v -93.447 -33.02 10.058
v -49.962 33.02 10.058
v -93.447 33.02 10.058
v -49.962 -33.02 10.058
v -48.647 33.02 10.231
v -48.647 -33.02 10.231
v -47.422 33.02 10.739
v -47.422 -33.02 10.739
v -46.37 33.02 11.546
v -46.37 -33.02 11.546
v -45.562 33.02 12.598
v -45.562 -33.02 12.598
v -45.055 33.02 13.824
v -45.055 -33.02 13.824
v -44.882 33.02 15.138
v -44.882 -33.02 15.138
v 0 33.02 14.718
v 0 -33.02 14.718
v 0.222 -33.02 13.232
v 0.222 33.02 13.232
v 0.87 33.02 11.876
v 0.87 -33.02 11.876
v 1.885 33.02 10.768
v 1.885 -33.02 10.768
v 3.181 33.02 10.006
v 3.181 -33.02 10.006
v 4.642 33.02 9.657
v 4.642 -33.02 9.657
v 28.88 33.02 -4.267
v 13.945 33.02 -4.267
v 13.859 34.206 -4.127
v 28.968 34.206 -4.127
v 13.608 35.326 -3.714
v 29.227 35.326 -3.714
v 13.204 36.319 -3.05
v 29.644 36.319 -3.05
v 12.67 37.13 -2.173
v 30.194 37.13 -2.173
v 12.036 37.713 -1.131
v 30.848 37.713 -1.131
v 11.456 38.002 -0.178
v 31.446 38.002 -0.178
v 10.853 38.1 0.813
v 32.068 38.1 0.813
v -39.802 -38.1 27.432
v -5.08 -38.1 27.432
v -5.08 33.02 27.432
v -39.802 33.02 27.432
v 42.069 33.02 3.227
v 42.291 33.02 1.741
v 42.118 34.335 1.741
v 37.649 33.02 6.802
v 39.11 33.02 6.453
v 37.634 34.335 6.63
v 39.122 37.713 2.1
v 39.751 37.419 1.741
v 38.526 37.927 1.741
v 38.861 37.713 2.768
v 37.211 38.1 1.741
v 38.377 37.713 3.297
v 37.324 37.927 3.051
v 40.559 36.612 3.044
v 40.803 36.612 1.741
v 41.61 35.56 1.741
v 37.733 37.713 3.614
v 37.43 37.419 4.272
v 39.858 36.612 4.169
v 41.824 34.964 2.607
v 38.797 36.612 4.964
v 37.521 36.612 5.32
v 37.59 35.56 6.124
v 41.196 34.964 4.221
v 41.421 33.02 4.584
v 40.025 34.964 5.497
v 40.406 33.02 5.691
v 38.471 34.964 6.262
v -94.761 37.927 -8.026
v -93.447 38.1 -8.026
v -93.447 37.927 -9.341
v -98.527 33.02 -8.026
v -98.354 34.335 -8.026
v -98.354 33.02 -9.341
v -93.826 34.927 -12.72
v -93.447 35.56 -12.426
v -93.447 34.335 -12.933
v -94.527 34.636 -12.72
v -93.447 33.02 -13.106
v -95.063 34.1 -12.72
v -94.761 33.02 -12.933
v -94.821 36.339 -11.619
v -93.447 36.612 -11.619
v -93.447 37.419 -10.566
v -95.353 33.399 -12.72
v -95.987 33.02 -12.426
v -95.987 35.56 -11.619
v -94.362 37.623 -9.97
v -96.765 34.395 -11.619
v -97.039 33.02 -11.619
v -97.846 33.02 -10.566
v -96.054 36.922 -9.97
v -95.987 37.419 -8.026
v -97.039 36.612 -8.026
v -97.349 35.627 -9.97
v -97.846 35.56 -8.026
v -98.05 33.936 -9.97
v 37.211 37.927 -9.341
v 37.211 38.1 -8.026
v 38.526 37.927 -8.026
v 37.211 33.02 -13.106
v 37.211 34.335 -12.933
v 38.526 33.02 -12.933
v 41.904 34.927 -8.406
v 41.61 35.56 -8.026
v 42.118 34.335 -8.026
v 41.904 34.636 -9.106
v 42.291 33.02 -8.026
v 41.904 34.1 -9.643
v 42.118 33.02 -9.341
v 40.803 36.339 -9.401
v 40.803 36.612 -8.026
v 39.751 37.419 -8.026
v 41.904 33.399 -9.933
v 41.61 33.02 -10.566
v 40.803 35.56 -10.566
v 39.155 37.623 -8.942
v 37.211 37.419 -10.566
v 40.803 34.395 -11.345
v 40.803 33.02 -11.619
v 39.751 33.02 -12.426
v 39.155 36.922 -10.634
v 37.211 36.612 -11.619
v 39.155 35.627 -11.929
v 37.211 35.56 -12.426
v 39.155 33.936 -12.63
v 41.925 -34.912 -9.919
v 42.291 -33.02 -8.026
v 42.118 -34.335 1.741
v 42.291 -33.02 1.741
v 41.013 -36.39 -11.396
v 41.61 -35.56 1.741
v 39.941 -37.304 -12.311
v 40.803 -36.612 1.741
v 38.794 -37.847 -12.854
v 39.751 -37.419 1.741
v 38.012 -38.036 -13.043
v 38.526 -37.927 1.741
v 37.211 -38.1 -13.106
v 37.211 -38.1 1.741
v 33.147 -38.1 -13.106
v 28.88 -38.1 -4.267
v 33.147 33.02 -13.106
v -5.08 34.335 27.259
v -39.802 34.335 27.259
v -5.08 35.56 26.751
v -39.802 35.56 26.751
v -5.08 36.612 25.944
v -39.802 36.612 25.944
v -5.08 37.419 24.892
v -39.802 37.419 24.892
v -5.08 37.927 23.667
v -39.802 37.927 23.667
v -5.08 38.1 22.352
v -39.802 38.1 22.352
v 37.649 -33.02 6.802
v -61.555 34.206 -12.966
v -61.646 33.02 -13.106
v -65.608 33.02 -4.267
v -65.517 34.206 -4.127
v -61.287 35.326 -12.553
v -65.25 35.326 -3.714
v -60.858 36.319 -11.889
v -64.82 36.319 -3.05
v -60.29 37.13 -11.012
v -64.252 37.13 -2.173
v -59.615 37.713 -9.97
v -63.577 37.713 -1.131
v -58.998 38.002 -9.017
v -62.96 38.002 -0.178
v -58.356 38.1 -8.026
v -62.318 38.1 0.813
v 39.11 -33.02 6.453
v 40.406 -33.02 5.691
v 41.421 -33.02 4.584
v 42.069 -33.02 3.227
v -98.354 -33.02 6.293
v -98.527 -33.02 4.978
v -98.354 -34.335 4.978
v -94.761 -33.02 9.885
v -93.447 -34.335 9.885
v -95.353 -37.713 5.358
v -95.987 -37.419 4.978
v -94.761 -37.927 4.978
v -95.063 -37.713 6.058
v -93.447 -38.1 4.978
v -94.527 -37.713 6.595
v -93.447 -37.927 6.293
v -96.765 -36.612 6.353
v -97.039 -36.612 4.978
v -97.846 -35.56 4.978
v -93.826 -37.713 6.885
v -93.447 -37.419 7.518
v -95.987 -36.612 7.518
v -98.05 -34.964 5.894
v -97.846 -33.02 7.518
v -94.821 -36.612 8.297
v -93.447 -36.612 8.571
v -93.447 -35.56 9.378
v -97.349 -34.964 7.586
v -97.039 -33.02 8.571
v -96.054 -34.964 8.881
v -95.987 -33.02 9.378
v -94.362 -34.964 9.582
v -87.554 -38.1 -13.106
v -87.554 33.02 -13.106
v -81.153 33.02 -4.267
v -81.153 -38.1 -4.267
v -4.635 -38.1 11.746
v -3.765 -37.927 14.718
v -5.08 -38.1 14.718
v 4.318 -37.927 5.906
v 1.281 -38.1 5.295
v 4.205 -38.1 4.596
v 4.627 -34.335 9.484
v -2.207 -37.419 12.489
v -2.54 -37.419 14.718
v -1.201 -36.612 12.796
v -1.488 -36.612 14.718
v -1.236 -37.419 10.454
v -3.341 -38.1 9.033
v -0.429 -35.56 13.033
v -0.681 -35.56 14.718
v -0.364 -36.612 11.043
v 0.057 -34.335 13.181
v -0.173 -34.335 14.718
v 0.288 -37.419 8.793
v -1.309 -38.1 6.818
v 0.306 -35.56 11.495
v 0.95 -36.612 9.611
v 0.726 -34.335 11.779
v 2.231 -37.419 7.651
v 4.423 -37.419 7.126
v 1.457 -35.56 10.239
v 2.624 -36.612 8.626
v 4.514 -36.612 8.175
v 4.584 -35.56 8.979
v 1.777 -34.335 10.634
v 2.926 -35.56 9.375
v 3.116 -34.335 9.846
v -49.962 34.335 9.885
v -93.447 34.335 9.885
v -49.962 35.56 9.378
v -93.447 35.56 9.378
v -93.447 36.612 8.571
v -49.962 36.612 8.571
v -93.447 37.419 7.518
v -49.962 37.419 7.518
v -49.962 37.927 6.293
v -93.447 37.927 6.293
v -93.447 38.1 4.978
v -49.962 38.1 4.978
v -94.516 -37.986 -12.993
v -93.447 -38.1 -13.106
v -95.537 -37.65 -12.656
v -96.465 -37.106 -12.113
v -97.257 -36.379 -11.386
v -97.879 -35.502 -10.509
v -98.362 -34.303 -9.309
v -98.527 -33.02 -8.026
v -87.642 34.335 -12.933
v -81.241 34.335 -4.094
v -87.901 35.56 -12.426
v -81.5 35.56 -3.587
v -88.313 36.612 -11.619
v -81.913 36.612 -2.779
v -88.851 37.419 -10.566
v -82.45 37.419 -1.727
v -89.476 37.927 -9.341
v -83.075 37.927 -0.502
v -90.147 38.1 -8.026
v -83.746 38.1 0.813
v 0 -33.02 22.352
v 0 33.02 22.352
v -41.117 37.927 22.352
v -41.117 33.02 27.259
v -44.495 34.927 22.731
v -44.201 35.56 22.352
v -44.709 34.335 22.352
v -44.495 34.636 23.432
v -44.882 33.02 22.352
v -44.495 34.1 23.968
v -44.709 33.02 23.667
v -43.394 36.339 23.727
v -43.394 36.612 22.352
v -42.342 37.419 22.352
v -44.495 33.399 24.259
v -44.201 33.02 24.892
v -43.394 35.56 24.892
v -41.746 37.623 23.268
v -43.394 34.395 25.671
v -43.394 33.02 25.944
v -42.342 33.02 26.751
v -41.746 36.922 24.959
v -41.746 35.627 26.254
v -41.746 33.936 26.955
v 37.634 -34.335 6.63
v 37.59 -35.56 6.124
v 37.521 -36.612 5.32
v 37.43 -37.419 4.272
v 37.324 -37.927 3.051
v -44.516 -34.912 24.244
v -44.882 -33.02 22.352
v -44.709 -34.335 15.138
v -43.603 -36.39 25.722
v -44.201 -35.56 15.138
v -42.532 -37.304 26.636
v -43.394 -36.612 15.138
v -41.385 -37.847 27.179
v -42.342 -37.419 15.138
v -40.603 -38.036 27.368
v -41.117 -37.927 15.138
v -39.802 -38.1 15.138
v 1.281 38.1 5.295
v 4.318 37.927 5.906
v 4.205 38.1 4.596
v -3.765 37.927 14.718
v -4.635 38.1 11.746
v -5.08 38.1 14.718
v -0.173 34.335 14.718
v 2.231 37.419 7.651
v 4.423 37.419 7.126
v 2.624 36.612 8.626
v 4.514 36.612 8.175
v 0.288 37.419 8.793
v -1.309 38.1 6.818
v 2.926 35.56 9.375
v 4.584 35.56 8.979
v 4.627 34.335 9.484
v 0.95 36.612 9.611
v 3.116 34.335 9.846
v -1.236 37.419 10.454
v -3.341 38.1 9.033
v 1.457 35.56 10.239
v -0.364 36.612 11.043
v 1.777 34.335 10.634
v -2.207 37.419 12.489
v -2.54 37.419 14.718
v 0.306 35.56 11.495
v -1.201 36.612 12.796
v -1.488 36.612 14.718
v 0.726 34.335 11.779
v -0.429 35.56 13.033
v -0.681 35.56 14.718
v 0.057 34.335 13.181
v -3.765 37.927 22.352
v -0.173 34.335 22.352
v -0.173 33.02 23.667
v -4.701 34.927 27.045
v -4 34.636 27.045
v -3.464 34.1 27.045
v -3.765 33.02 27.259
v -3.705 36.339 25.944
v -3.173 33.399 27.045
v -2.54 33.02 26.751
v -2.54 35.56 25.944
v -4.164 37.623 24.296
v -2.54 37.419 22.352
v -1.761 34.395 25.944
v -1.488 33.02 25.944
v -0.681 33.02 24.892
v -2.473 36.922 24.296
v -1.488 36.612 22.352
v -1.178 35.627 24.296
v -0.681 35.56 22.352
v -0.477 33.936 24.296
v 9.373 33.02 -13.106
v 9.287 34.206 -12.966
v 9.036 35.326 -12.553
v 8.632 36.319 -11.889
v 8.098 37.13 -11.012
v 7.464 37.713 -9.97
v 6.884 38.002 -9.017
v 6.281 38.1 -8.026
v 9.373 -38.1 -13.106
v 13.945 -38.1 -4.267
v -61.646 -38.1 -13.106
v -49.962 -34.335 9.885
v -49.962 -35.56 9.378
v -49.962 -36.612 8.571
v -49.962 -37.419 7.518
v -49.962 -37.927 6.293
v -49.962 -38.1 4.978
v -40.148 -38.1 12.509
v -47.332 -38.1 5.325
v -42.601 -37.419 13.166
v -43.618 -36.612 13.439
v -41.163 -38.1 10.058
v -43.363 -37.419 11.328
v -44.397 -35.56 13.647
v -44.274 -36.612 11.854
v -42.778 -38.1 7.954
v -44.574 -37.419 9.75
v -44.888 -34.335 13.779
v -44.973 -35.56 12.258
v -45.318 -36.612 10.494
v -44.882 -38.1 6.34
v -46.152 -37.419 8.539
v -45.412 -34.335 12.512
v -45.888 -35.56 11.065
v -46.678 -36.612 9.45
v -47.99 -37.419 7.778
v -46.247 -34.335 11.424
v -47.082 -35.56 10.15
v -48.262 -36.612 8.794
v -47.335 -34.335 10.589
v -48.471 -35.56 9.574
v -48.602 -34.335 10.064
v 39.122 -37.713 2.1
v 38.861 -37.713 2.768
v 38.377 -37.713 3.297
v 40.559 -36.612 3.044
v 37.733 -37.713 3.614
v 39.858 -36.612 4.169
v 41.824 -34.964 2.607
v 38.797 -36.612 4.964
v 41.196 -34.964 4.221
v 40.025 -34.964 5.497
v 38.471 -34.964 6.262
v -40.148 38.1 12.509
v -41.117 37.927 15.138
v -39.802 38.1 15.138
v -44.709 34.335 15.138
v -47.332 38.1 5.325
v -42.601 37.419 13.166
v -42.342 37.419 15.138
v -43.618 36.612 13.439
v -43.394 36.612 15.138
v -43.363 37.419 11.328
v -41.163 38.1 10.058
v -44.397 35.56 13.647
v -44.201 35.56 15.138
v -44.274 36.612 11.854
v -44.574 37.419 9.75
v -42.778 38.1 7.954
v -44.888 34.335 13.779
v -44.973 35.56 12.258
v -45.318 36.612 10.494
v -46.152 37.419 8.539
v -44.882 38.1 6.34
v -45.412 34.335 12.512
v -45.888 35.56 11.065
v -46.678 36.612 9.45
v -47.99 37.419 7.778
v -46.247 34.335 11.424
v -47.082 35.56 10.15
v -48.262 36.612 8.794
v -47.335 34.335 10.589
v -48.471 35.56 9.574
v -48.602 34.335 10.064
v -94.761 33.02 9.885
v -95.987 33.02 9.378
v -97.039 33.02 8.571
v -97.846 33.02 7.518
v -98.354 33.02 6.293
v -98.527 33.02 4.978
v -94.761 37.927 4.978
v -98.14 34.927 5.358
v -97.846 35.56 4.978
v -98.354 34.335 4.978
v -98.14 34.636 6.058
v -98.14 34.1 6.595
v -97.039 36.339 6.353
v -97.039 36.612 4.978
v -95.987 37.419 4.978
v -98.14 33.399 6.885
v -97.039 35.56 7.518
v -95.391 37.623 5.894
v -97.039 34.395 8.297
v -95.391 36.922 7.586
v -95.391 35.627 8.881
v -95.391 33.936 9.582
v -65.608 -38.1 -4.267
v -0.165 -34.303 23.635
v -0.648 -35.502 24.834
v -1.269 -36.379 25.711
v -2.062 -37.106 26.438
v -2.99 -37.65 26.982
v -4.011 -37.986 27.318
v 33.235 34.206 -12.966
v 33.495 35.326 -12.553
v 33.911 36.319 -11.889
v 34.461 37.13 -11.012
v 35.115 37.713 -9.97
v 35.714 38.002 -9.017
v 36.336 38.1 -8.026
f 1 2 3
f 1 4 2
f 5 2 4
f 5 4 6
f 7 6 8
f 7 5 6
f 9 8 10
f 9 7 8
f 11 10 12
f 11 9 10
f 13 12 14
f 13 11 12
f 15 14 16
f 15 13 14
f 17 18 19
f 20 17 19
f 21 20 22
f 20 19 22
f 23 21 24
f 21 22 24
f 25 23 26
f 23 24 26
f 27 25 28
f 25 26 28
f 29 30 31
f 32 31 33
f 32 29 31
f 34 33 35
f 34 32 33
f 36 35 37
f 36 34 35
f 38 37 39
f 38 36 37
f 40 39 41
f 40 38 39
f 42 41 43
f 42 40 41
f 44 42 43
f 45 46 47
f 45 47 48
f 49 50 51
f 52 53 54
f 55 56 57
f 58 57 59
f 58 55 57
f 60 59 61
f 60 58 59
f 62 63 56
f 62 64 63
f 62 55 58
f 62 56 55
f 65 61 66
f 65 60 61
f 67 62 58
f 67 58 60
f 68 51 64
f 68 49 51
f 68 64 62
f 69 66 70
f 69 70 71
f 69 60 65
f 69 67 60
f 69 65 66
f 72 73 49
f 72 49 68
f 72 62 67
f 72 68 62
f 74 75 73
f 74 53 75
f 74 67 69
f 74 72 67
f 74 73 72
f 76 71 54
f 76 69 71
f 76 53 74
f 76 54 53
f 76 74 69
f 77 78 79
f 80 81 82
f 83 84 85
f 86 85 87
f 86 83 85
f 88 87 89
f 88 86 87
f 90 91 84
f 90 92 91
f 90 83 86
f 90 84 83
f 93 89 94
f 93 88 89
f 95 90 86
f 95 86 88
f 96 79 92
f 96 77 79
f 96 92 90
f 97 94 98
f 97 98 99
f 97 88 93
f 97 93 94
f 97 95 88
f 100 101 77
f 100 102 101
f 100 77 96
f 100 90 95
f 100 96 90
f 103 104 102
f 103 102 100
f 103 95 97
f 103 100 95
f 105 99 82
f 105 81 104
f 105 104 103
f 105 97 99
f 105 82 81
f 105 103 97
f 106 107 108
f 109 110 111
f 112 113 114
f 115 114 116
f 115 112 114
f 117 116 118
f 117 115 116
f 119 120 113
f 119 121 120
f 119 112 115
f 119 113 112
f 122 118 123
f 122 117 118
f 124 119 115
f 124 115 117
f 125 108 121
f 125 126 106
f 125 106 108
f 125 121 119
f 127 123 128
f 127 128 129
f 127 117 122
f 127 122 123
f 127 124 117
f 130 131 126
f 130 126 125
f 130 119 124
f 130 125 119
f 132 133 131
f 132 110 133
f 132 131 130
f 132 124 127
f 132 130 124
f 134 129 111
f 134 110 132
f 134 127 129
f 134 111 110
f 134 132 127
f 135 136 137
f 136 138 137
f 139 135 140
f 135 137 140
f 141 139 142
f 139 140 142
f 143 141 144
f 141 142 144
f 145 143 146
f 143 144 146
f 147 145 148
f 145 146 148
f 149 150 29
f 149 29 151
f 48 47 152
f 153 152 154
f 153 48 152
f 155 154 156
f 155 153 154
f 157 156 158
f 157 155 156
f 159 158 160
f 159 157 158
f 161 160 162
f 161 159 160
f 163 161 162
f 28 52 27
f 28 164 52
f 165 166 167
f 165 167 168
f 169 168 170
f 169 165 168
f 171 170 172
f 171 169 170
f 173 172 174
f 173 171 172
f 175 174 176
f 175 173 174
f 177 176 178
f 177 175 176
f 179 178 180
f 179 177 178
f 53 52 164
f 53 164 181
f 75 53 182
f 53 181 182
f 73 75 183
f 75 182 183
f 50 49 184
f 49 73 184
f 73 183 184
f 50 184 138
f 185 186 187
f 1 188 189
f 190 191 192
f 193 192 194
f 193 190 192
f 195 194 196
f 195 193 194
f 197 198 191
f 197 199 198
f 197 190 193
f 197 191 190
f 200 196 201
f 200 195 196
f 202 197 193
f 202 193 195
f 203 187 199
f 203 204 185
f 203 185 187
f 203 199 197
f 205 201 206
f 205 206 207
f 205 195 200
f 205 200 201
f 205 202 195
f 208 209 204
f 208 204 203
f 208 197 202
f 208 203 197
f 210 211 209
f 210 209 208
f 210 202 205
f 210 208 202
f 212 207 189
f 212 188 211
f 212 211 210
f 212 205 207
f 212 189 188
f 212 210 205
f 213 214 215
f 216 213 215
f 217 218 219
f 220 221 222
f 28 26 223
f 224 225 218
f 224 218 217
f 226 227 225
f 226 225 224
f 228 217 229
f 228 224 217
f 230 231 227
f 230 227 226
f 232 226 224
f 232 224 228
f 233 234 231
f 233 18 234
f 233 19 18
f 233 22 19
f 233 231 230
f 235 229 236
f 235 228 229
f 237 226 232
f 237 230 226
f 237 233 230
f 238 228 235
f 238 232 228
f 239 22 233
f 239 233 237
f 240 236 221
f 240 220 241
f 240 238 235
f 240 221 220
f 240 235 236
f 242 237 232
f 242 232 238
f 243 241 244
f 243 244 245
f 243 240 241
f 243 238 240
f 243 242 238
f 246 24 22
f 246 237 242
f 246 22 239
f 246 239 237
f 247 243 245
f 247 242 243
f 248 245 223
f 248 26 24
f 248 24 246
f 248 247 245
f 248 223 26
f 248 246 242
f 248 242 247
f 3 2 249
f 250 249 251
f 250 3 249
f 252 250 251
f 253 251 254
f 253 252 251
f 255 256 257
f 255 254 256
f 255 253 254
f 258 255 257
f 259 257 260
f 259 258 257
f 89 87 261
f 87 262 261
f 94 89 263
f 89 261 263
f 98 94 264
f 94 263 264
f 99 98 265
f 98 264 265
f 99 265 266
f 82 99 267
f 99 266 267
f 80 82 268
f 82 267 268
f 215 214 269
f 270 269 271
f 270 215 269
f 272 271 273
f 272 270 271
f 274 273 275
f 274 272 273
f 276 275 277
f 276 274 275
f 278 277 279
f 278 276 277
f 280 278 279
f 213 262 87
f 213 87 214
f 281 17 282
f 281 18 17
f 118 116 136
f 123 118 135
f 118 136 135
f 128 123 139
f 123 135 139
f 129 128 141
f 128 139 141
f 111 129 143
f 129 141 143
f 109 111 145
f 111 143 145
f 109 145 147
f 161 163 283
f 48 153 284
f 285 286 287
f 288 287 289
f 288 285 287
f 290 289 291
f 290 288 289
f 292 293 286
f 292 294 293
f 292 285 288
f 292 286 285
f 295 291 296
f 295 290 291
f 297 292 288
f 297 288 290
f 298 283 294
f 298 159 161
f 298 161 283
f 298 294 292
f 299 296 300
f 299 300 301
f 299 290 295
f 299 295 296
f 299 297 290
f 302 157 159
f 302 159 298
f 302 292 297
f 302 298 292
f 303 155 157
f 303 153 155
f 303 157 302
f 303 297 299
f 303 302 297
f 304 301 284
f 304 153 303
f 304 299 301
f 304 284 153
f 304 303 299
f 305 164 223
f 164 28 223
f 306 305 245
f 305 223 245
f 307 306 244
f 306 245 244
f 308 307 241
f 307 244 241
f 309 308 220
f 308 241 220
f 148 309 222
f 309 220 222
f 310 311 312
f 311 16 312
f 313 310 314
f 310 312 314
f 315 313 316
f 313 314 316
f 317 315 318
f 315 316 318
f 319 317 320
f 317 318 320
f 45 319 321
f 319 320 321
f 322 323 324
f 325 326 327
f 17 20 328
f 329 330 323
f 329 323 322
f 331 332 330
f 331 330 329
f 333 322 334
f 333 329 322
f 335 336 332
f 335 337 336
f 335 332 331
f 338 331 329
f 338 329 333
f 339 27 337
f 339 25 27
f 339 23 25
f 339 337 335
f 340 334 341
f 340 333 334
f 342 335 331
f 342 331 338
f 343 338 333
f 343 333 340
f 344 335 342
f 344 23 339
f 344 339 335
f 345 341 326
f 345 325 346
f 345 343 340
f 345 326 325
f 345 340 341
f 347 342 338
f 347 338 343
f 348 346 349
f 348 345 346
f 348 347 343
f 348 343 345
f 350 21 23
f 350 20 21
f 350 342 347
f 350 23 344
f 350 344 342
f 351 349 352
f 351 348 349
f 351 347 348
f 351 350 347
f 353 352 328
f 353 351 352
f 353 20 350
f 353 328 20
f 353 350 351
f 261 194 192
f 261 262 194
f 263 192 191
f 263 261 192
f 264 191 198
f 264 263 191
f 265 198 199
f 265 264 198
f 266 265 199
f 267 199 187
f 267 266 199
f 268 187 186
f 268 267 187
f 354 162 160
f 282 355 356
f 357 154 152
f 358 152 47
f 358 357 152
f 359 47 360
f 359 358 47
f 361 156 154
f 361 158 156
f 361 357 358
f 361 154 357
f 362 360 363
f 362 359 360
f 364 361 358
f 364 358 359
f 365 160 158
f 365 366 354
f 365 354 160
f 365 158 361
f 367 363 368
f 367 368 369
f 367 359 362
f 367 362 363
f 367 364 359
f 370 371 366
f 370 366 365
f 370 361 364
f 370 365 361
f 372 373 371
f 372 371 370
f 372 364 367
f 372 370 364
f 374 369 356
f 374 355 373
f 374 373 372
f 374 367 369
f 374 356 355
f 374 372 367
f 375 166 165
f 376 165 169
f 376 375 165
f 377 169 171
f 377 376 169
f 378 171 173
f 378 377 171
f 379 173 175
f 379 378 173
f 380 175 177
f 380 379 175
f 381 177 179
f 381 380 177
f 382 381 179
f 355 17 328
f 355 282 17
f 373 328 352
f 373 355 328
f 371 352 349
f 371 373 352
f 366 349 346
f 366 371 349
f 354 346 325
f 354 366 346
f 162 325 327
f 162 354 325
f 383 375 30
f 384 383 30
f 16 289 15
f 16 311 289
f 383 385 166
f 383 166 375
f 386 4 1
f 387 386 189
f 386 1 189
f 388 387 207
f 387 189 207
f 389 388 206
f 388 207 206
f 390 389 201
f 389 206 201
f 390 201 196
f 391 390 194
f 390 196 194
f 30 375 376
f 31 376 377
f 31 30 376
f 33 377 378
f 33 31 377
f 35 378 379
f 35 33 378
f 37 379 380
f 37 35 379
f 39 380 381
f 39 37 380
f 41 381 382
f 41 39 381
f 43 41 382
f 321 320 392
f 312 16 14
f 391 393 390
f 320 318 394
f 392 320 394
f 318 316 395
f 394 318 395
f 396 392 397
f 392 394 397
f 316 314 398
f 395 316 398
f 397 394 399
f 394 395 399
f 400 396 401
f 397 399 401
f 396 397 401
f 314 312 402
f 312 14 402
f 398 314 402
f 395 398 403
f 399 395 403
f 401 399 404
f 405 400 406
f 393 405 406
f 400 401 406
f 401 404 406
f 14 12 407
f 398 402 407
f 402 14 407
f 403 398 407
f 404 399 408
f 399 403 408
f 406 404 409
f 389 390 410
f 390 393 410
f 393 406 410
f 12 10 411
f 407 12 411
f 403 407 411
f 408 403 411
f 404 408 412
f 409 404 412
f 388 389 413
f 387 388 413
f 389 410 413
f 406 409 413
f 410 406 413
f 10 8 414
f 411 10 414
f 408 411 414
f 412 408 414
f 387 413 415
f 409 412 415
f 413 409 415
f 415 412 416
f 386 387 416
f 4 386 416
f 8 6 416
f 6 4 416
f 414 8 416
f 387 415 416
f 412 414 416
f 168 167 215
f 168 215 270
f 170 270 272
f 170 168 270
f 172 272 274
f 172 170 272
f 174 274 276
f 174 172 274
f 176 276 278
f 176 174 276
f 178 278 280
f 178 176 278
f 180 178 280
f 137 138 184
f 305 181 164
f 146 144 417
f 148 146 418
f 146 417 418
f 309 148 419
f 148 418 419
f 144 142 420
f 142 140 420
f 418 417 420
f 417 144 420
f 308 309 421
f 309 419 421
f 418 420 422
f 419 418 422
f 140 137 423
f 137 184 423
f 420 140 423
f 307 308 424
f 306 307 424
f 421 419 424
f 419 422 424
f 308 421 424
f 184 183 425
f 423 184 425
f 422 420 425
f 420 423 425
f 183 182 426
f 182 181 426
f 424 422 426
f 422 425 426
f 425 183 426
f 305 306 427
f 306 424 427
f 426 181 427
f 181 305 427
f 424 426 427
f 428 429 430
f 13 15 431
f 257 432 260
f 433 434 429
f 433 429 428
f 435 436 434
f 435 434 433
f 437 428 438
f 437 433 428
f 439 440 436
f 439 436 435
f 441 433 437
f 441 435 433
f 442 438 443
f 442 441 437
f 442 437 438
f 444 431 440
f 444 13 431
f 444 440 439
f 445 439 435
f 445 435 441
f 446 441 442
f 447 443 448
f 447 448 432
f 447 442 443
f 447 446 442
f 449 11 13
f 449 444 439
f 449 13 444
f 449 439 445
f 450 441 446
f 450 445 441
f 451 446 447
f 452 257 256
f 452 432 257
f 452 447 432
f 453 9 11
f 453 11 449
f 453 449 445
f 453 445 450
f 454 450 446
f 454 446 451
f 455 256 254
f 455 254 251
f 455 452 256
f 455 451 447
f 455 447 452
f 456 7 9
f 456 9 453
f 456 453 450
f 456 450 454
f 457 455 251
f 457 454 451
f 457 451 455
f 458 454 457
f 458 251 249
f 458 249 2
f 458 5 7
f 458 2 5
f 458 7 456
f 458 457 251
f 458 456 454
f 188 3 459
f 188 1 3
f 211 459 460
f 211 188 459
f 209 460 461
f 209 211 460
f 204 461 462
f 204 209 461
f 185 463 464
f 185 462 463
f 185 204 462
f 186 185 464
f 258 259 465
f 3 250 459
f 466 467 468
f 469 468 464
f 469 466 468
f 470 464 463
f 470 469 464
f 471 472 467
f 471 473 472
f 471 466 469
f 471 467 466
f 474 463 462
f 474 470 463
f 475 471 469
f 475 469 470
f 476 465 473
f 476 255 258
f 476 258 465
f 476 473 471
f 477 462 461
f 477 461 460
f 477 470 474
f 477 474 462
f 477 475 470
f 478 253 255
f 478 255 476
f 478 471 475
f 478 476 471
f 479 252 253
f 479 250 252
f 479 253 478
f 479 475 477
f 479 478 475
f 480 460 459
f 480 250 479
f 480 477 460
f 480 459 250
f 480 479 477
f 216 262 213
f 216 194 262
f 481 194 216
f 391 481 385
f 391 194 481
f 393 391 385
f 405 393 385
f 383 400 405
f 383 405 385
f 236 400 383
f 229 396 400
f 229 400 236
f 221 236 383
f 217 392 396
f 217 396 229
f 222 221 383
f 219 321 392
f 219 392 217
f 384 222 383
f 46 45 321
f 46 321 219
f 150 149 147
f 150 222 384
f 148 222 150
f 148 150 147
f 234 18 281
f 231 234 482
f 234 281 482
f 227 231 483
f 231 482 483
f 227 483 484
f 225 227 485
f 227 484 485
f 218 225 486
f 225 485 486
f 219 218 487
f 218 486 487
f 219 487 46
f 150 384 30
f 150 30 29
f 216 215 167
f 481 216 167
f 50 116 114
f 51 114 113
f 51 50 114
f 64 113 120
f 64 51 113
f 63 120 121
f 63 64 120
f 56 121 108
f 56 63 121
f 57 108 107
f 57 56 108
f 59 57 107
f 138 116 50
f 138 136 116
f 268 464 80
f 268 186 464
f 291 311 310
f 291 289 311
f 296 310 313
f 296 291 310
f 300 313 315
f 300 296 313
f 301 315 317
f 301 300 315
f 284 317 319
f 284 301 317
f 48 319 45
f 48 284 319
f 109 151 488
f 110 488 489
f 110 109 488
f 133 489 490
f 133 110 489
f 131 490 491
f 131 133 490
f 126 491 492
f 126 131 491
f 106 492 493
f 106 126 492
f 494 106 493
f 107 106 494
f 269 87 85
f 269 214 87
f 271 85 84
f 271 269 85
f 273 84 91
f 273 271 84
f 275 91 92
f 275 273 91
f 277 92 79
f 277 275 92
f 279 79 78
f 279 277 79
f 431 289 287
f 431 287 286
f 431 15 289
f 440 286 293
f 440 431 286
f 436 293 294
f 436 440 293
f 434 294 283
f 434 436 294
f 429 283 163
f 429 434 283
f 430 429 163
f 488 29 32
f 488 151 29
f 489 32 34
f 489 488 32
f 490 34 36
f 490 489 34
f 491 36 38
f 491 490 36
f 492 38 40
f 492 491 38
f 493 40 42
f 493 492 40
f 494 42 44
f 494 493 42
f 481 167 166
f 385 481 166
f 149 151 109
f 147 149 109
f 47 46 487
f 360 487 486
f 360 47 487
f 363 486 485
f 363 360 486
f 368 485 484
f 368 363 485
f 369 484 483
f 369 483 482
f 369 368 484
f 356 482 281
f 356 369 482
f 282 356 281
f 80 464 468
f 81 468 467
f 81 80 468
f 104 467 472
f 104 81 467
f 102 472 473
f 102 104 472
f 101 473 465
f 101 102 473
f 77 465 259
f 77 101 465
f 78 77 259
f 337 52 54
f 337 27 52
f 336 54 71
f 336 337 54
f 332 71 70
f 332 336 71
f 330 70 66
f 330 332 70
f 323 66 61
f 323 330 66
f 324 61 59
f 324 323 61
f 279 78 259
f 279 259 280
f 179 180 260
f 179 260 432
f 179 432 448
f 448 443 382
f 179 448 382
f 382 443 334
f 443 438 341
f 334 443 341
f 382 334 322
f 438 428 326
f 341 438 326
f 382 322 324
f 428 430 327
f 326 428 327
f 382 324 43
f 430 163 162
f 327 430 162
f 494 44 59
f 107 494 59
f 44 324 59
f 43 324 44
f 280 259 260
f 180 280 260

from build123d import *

# Parameters (mm, degrees)
F1_DEPTH = 38.1
F2_R     = 5.08


with BuildPart() as f1:
    # F0 (on Front) → F1 (new body, symmetric)
    with BuildSketch(Plane.XZ):
        Polygon((-44.8818020523, 10.0584002212), (-98.5266044736, 10.0584002212), (-98.5266044736, -13.1064001471), (-87.5537991524, -13.1064001471), (-81.152997911, -4.2672003619), (-65.6082034111, -4.2672003619), (-61.6458021104, -13.1064001471), (9.3726003543, -13.1064001471), (13.9445997775, -4.2672003619), (28.8797989488, -4.2672003619), (33.1469997764, -13.1064001471), (42.2910004854, -13.1064001471), (42.2910004854, 6.4007998444), (0, 10.0584002212), (0, 27.4320002645), (-44.8818020523, 27.4320002645), align=None)
    extrude(amount=F1_DEPTH, both=True)

    # F2
    f2_edges = [f1.edges().sort_by_distance(p)[0] for p in [
        (21.412199, 38.1, -4.2672),
        (31.013399, 38.1, -8.6868),
        (37.719, 38.1, -13.1064),
        (42.291, 38.1, -3.3528),
        (21.1455, 38.1, 8.2296),
        (0, 38.1, 18.7452),
        (-22.440901, 38.1, 27.432),
        (-44.881802, 38.1, 18.7452),
        (-71.704203, 38.1, 10.0584),
        (-98.526604, 38.1, -1.524),
        (-93.040202, 38.1, -13.1064),
        (-84.353399, 38.1, -8.6868),
        (-73.380601, 38.1, -4.2672),
        (-63.627003, 38.1, -8.6868),
        (-26.136601, 38.1, -13.1064),
        (11.6586, 38.1, -8.6868),
        (-98.526604, 0, 10.0584),
        (-98.526604, 0, -13.1064),
        (-98.526604, -38.1, -1.524),
        (-44.881802, 0, 27.432),
        (-44.881802, 0, 10.0584),
        (-44.881802, -38.1, 18.7452),
        (0, 0, 10.0584),
        (0, 0, 27.432),
        (0, -38.1, 18.7452),
        (42.291, 0, -13.1064),
        (42.291, 0, 6.4008),
        (42.291, -38.1, -3.3528),
        (-71.704203, -38.1, 10.0584),
        (21.1455, -38.1, 8.2296),
    ]]
    fillet(f2_edges, radius=F2_R)


solid = f1.part
